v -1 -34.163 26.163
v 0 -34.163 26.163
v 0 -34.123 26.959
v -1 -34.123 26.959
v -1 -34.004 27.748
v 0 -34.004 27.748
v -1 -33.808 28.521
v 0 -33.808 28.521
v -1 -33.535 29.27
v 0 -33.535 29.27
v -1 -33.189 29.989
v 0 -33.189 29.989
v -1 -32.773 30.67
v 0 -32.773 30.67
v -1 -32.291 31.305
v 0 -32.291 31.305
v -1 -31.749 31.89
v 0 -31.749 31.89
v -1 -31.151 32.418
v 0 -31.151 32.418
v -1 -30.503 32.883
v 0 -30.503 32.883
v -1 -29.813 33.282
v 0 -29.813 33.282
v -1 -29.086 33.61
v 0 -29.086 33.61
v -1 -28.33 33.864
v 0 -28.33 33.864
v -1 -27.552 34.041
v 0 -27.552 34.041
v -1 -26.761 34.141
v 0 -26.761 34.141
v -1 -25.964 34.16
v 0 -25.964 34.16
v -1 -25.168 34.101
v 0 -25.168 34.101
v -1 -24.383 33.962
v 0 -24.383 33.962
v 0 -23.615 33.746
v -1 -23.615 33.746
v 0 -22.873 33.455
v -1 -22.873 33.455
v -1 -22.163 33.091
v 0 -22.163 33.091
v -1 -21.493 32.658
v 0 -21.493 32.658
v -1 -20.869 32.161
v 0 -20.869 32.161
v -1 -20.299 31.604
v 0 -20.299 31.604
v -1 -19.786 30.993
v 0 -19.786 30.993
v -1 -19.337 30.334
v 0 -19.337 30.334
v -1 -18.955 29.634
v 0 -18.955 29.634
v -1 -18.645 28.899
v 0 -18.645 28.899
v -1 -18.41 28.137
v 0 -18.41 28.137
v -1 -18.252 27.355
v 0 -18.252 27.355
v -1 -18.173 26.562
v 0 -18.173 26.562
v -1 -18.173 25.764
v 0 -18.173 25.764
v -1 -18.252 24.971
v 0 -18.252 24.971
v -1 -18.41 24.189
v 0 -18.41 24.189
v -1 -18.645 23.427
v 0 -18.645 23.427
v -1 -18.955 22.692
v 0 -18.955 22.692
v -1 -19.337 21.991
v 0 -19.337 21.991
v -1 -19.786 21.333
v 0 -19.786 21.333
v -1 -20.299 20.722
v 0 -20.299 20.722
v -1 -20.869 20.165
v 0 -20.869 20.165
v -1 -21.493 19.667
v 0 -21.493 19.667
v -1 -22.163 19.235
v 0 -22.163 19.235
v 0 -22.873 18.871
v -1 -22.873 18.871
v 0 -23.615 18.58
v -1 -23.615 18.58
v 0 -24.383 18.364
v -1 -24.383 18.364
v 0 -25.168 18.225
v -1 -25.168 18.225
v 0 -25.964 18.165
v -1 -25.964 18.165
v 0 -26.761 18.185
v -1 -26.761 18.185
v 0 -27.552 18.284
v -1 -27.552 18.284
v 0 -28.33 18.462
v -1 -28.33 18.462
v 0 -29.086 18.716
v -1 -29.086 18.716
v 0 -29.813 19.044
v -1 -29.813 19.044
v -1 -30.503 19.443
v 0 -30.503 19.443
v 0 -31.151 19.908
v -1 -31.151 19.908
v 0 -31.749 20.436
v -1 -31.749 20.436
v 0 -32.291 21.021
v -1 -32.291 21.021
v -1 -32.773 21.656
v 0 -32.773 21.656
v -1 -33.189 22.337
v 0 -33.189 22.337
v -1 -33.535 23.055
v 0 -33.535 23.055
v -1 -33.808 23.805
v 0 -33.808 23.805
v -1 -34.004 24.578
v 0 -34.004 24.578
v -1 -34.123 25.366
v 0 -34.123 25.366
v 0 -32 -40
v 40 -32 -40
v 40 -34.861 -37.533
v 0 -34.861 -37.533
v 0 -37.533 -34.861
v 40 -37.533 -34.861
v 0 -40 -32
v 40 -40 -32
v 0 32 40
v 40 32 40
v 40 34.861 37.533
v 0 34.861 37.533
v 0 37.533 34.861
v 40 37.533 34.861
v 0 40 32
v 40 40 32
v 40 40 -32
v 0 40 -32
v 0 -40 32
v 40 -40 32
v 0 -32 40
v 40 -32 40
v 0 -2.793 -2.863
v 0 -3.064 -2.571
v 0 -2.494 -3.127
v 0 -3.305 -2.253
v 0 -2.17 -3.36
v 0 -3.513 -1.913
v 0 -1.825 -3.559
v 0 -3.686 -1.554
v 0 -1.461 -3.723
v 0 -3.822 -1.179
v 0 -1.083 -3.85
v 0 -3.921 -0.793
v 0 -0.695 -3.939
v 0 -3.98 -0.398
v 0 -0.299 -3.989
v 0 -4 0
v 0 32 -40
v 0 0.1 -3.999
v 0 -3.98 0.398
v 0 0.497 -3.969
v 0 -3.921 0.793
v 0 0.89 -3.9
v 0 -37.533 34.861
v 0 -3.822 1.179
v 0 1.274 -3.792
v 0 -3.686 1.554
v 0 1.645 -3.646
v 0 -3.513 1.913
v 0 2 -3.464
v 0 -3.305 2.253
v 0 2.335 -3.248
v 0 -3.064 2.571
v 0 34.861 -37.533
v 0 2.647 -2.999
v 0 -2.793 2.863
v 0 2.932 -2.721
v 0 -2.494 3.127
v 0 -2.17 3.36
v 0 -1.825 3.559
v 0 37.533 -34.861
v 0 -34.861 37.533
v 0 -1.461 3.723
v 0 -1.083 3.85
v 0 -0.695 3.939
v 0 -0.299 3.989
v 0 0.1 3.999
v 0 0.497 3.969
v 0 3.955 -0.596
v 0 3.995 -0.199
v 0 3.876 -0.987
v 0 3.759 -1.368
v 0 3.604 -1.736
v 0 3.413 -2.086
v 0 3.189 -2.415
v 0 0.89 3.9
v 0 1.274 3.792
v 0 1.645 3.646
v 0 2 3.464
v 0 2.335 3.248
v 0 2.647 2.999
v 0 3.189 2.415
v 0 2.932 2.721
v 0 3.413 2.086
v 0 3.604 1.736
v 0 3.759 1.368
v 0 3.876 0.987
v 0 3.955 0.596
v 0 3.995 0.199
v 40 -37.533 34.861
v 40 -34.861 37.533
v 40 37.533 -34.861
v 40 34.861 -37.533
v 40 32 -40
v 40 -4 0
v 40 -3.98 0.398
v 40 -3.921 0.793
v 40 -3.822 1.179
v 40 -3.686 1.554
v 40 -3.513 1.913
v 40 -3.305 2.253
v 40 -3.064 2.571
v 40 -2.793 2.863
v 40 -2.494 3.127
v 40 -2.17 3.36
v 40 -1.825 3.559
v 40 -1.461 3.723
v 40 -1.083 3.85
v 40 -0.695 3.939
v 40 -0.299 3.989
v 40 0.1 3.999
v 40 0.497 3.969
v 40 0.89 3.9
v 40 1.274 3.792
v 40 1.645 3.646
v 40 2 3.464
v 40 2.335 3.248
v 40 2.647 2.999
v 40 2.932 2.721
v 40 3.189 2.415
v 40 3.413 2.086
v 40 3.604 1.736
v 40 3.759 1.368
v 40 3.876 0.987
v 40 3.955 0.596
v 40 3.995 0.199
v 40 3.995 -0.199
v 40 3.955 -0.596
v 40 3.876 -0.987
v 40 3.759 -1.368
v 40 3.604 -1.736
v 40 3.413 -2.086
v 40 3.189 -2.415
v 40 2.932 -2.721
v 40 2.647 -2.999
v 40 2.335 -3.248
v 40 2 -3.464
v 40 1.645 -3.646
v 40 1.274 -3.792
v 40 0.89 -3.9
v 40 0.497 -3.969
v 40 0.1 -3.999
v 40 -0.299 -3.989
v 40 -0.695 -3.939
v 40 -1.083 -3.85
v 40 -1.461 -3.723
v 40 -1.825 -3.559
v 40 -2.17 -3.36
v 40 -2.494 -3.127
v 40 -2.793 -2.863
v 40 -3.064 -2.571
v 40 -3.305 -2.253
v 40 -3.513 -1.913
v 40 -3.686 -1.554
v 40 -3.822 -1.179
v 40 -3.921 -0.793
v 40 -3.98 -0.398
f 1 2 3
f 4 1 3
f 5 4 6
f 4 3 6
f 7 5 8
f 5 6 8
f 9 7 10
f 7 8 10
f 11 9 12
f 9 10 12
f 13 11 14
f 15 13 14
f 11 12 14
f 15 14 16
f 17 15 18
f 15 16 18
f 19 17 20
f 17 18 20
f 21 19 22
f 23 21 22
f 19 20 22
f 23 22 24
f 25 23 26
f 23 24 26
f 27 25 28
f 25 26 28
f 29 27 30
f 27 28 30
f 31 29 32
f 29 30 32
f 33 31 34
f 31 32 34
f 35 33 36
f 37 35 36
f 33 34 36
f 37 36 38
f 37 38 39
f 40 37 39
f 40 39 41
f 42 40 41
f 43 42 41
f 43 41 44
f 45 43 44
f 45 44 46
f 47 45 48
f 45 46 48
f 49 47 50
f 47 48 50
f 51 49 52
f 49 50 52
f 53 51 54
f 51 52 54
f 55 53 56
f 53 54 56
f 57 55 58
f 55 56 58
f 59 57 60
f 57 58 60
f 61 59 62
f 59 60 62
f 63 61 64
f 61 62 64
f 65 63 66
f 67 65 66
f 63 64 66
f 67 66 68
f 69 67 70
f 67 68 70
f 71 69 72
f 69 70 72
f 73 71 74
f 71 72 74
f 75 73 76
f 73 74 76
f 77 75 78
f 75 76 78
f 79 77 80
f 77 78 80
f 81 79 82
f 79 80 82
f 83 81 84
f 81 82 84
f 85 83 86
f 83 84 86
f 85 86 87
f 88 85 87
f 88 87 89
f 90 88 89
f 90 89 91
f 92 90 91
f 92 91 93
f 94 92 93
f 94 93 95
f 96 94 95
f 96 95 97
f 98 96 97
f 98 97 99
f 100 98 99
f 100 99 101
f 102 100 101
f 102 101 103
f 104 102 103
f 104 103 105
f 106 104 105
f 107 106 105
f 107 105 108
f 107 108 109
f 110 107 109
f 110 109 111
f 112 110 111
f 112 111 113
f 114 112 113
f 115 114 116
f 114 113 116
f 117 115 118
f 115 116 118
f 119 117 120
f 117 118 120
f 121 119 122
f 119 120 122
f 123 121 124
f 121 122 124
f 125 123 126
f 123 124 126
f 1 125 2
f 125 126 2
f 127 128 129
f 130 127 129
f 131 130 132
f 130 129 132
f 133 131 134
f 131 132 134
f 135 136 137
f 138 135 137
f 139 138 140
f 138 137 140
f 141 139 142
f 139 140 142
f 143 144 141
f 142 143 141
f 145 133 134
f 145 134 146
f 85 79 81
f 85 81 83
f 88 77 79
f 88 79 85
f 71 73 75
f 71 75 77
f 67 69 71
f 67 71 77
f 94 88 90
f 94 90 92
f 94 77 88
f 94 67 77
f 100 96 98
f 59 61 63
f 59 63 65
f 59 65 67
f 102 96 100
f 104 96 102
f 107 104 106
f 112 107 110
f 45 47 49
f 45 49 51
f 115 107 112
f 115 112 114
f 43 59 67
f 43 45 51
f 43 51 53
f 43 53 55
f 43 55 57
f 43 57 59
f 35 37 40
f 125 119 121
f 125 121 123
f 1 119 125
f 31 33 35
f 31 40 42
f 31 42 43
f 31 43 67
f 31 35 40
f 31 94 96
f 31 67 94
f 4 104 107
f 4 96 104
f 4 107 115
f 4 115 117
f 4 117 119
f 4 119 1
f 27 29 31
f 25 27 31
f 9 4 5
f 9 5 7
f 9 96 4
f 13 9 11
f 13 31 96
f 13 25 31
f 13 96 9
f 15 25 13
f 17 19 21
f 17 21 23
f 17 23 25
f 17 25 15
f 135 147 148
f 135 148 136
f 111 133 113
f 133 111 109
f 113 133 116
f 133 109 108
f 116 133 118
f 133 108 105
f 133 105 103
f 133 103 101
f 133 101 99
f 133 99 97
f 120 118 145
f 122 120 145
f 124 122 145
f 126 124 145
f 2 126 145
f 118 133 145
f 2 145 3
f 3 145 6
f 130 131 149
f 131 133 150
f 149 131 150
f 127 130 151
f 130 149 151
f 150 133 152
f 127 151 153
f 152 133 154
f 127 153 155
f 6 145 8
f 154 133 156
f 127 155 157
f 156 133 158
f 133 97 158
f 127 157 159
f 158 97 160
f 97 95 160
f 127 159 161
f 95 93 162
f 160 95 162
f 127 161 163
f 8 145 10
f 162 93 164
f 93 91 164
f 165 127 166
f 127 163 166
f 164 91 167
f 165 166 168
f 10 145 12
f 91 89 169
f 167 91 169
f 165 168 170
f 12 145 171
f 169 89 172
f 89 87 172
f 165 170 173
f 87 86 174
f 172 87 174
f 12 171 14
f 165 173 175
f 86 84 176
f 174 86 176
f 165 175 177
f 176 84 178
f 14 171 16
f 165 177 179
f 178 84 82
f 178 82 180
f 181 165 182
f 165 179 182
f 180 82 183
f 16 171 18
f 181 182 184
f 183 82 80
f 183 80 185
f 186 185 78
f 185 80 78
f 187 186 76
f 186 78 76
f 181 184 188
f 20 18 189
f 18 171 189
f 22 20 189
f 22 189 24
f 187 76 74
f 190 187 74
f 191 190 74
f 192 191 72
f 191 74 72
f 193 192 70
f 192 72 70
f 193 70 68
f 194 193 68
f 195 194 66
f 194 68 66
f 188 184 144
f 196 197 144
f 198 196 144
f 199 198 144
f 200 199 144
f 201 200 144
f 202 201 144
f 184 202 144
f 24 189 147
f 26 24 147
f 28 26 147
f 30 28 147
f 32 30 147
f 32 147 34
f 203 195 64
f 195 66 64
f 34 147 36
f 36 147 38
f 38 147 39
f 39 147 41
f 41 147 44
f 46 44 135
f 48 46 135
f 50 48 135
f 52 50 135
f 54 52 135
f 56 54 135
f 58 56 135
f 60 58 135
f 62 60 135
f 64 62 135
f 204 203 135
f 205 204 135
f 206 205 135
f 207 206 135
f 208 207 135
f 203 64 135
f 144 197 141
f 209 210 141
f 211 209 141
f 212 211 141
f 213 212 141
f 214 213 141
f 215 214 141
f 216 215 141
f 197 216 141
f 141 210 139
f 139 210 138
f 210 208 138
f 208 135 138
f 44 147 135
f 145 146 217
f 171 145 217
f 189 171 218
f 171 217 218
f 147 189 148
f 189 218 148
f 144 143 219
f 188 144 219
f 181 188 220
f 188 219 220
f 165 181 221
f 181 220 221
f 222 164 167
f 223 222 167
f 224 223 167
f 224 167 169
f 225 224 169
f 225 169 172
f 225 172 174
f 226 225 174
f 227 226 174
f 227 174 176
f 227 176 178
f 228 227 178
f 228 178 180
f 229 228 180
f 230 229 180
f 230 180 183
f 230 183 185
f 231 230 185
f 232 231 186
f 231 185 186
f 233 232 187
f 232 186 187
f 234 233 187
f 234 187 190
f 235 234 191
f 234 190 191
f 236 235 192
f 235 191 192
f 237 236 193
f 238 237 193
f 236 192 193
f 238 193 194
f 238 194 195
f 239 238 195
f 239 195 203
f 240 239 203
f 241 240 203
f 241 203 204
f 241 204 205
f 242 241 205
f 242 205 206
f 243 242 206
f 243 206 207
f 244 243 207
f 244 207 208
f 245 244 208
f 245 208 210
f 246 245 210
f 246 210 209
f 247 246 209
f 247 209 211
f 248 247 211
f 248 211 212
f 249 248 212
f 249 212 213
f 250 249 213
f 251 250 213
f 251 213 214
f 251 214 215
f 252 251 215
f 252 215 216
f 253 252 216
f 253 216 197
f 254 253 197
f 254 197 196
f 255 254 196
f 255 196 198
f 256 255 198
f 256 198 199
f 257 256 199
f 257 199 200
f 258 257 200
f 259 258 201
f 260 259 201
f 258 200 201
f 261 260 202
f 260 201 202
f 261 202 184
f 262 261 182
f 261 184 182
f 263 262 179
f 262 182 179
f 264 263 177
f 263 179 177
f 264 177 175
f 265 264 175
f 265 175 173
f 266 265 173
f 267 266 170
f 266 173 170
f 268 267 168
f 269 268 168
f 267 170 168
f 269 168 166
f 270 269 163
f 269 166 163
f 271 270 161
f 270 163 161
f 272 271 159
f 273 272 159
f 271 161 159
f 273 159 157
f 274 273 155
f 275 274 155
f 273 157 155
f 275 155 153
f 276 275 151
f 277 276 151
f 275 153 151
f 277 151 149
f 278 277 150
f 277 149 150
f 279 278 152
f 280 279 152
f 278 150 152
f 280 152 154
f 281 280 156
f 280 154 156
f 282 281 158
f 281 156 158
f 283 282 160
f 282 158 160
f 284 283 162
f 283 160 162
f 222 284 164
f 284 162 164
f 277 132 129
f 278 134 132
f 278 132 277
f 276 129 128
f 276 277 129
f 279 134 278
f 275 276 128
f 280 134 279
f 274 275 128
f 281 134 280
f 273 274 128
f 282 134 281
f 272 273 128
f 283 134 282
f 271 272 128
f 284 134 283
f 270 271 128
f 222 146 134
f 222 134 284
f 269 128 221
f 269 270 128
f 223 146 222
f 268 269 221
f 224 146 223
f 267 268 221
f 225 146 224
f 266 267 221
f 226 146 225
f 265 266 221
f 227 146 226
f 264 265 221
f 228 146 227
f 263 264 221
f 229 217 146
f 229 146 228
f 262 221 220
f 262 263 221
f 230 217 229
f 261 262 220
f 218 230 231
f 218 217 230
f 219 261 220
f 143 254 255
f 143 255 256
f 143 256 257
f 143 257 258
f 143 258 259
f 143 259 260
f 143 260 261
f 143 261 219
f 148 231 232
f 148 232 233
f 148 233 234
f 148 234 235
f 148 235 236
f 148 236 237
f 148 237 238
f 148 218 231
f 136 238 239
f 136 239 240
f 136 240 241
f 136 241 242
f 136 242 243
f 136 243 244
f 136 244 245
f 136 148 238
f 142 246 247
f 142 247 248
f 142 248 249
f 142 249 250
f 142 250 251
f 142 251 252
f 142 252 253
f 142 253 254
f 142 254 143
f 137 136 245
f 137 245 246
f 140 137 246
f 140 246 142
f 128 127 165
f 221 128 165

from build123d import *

# Parameters (mm, degrees)
F0_W     = 80
F0_H     = 80
F1_DEPTH = 40
F3_DEPTH = 40.001
F4_R     = 4
F5_DEPTH = 40.001
F6_R     = 8
F7_DEPTH = 1


with BuildPart() as f1:
    # F0 (on Right) → F1 (new body)
    with BuildSketch(Plane.YZ):
        Rectangle(F0_W, F0_H)
    extrude(amount=F1_DEPTH)

    # F2 (on face) → F3 (cut, through all)
    with BuildSketch(Plane.YZ.offset(40)):
        with BuildLine():
            ThreePointArc((-40, 32), (-36.221541, 36.221541), (-32, 40))
            Line((-32, 40), (-40, 40))
            Line((-40, 40), (-40, 32))
        make_face()
        with BuildLine():
            ThreePointArc((-32, -40), (-36.221541, -36.221541), (-40, -32))
            Line((-40, -32), (-40, -40))
            Line((-40, -40), (-32, -40))
        make_face()
        with BuildLine():
            ThreePointArc((40, -32), (36.221541, -36.221541), (32, -40))
            Line((32, -40), (40, -40))
            Line((40, -40), (40, -32))
        make_face()
        with BuildLine():
            ThreePointArc((32, 40), (36.221541, 36.221541), (40, 32))
            Line((40, 32), (40, 40))
            Line((40, 40), (32, 40))
        make_face()
    extrude(amount=-F3_DEPTH, mode=Mode.SUBTRACT)

    # F4 (on face) → F5 (cut, through all)
    with BuildSketch(Plane(origin=(0, 0, 0), x_dir=(0, -1, 0), z_dir=(-1, 0, 0))):
        Circle(F4_R)
    extrude(amount=-F5_DEPTH, mode=Mode.SUBTRACT)

    # F6 (on face) → F7 (join)
    with BuildSketch(Plane(origin=(0, 0, 0), x_dir=(0, -1, 0), z_dir=(-1, 0, 0))):
        with Locations((26.162951, 26.162951)):
            Circle(F6_R)
    extrude(amount=F7_DEPTH)


solid = f1.part
